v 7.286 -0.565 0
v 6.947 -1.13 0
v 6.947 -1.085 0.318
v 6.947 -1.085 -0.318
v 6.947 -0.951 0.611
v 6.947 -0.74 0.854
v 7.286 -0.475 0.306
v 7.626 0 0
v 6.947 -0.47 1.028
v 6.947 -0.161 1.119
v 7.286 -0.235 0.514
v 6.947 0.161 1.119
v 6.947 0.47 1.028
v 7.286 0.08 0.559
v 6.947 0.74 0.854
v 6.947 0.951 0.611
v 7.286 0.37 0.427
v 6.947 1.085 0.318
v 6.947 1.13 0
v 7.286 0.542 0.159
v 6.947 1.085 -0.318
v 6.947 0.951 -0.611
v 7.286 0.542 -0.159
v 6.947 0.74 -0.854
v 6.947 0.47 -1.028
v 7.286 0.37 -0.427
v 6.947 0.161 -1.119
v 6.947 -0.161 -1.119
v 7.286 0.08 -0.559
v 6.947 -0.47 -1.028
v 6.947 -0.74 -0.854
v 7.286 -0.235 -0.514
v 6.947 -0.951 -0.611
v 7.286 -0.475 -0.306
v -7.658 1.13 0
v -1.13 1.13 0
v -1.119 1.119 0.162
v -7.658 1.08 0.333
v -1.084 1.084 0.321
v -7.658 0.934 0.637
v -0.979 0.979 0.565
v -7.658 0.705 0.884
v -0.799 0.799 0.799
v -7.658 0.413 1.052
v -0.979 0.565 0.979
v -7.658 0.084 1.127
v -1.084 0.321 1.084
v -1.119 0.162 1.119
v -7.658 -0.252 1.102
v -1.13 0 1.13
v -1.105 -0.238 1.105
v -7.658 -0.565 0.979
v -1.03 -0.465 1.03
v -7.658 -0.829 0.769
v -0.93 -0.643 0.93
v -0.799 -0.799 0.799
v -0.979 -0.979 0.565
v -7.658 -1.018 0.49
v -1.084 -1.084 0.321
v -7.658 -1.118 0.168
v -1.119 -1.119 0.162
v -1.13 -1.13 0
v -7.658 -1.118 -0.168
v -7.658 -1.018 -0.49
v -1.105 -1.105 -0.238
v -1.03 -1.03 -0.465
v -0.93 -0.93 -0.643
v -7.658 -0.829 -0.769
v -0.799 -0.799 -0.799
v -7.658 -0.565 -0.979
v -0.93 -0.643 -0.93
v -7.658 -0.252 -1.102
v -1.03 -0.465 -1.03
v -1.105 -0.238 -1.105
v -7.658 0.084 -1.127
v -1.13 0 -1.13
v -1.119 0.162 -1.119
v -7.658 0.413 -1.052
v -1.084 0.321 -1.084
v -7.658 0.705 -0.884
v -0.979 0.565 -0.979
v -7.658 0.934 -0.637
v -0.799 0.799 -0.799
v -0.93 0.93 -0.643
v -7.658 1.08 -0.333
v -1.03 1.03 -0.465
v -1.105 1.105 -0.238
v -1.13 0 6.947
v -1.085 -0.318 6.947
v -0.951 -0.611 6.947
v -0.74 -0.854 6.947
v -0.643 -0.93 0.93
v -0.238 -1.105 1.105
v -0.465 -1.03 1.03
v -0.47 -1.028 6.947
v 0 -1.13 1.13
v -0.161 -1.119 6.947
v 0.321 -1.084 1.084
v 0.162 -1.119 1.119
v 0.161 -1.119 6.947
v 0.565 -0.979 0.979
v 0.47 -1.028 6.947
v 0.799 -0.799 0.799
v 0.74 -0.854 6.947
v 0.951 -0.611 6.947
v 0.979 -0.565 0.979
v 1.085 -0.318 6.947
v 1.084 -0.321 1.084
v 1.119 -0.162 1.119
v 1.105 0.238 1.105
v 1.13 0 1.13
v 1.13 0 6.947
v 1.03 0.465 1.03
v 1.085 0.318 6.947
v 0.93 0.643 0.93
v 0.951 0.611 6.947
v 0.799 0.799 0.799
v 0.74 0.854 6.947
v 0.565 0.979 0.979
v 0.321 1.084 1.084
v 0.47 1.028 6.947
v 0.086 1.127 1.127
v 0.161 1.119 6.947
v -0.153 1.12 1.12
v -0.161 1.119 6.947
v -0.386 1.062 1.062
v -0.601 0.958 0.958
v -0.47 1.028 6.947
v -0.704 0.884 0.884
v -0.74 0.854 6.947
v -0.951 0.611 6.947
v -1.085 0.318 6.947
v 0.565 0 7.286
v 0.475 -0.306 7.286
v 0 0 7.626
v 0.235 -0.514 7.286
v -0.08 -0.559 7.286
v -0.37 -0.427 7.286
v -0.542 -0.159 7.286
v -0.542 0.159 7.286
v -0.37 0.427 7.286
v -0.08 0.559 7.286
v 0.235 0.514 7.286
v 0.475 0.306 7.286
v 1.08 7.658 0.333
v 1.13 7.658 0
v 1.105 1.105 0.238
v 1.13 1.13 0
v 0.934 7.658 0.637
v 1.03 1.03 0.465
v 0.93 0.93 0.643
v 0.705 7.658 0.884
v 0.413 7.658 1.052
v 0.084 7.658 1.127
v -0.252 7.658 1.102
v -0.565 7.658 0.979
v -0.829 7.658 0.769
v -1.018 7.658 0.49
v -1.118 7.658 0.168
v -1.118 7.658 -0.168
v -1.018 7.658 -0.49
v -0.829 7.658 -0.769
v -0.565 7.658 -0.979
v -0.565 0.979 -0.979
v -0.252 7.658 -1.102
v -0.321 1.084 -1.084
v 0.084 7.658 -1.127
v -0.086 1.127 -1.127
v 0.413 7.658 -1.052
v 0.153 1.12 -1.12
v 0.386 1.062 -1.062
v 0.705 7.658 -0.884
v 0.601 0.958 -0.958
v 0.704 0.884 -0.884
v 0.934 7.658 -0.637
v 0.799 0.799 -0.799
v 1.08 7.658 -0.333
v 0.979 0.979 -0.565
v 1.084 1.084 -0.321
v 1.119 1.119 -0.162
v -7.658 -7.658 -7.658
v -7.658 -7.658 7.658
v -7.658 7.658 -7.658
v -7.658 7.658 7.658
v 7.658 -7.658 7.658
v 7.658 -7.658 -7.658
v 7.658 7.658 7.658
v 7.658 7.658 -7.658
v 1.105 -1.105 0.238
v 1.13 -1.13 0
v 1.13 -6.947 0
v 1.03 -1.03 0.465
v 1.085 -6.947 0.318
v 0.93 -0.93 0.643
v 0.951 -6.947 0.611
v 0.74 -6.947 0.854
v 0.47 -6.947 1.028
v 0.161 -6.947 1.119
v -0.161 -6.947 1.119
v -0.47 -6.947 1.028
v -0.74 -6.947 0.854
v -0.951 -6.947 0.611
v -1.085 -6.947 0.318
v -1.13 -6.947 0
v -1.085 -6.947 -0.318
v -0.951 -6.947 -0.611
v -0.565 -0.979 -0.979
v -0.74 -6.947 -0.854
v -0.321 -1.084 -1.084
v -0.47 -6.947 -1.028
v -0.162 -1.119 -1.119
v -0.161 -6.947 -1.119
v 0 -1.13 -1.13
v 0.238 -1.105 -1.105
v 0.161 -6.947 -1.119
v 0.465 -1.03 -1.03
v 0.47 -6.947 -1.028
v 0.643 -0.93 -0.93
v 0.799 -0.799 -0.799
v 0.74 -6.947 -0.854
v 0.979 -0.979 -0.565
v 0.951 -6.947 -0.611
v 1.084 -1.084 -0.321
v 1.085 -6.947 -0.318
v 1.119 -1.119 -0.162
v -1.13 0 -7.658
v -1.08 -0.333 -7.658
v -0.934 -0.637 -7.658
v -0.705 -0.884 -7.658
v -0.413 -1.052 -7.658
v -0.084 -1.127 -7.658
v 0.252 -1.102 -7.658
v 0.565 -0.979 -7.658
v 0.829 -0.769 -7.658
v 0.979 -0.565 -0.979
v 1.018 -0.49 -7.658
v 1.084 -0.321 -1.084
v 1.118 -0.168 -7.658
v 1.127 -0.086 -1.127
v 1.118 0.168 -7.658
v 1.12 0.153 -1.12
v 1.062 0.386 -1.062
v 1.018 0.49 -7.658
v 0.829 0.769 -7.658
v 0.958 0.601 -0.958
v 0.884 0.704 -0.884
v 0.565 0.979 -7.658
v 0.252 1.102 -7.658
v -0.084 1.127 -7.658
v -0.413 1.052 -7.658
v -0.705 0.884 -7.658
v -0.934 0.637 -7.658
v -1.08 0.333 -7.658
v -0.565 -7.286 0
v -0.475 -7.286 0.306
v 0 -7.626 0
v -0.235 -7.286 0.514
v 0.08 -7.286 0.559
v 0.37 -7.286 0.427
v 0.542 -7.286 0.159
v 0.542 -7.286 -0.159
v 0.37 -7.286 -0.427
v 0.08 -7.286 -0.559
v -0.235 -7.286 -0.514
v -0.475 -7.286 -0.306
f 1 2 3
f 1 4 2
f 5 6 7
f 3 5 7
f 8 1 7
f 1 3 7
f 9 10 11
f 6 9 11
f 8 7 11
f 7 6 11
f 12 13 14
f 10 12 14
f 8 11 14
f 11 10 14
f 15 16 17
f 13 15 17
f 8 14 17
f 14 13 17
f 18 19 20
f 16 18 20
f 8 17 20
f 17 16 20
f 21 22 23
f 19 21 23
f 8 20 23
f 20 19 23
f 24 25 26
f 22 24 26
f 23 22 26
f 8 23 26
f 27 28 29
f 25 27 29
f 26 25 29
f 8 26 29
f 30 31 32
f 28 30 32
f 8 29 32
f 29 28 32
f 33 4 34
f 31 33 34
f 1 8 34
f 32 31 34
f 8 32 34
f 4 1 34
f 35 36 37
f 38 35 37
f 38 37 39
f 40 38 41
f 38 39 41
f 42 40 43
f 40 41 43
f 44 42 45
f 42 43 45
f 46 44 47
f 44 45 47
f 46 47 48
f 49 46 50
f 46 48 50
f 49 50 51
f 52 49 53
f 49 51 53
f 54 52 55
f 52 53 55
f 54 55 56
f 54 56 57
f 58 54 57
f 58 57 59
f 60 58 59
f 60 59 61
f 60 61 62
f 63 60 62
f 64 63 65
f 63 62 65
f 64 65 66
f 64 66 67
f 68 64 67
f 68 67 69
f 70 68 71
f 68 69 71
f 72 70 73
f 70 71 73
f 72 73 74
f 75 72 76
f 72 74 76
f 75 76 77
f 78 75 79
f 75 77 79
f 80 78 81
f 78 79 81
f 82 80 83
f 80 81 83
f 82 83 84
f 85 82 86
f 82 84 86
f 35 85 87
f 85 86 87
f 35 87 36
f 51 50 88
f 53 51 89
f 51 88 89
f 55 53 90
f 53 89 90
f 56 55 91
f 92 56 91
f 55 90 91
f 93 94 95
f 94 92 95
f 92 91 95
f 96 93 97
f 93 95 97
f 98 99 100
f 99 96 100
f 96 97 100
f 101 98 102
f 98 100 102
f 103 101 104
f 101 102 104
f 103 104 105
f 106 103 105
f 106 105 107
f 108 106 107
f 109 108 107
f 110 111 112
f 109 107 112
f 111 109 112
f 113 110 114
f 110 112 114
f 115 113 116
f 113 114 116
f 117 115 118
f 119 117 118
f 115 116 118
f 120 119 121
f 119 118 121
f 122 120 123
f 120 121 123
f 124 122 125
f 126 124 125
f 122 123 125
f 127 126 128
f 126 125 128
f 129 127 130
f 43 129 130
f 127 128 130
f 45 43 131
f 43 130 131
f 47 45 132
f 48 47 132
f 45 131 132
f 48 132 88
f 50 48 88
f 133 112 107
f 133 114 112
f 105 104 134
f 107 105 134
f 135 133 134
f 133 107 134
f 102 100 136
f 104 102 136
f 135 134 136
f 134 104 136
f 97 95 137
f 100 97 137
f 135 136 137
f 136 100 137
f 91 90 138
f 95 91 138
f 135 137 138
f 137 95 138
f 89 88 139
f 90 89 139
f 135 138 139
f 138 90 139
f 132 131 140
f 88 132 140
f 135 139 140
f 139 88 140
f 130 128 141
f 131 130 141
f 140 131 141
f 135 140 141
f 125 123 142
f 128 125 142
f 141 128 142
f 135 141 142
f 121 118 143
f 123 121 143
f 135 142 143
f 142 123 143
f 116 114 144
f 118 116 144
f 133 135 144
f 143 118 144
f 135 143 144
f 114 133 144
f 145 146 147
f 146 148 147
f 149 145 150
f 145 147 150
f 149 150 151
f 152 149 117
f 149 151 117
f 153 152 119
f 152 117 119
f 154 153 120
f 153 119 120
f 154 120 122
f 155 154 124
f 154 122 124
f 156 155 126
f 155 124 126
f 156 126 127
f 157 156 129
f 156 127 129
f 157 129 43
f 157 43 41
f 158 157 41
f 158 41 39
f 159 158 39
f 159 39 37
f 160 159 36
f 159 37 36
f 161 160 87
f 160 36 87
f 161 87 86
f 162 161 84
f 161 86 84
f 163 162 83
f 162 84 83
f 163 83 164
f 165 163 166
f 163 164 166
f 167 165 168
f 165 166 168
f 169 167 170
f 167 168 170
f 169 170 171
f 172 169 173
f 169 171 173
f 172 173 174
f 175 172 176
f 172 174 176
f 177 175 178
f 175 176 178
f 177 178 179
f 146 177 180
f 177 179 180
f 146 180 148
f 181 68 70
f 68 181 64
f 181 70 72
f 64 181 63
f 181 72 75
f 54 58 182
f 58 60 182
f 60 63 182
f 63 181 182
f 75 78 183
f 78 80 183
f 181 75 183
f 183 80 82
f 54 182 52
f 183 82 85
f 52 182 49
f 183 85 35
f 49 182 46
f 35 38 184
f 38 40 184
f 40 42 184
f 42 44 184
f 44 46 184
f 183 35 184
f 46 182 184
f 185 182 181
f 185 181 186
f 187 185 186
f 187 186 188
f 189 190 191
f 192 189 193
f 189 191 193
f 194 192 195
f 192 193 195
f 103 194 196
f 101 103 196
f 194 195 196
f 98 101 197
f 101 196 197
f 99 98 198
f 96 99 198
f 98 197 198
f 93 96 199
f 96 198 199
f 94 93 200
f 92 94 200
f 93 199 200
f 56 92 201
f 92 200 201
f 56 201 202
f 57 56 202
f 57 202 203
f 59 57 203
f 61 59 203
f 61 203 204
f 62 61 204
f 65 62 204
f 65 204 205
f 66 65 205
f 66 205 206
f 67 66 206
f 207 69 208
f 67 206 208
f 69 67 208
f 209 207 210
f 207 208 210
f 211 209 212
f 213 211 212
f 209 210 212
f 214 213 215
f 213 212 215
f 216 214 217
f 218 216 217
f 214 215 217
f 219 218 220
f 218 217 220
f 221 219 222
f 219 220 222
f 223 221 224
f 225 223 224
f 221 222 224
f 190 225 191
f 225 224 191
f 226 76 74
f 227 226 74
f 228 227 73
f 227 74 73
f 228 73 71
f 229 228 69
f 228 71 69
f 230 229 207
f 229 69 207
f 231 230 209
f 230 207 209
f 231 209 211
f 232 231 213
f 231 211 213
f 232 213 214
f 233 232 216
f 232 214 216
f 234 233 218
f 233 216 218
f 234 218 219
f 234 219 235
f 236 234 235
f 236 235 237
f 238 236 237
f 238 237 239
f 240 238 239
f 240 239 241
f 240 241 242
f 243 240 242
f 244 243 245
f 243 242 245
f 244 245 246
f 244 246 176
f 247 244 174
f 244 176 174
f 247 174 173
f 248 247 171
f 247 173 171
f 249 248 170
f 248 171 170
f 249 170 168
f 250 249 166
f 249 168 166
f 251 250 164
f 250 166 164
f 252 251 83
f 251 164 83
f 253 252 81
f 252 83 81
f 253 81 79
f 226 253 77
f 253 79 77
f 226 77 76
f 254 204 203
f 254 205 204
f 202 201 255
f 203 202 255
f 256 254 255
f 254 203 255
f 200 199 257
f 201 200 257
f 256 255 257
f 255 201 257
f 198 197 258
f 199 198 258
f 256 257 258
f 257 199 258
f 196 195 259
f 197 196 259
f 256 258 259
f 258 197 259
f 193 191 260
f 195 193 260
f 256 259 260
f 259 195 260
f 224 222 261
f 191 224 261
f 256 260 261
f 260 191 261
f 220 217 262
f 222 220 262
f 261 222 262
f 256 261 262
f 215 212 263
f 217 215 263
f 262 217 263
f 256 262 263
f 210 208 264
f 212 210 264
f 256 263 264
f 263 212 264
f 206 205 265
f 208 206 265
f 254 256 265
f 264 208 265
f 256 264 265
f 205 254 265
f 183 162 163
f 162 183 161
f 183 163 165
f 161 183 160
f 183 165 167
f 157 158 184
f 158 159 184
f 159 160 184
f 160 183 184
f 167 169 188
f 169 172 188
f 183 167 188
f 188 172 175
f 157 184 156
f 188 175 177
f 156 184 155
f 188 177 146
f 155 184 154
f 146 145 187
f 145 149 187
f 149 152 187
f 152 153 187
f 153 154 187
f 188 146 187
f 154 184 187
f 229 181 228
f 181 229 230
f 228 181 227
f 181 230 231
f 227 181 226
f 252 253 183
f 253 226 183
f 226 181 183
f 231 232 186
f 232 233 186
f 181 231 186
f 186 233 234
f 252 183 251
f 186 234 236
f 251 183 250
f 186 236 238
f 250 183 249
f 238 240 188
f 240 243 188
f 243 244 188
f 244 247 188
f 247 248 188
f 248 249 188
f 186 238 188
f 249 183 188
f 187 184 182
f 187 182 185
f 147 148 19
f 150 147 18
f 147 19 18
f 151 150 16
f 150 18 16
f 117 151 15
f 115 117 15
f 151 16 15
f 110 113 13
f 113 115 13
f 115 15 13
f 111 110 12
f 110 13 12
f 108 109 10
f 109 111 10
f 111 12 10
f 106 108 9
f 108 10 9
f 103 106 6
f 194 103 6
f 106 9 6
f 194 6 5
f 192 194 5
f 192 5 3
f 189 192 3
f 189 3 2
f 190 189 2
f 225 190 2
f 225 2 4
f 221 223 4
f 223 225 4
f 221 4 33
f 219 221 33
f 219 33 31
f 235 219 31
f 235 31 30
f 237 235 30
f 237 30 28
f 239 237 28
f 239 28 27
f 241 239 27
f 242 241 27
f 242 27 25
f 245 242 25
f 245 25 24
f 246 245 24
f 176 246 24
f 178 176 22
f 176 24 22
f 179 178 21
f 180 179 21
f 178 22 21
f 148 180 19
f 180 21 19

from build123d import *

# Parameters (mm, degrees)
F0_W          = 15.3162
F0_H          = 15.3162
F1_DEPTH      = 7.6581
F1_DEPTH_BACK = 7.6581
F3_D          = 2.2606
F3_DEPTH      = 14.605
F3_TIP        = 0.6791527577
F5_D          = 2.2606
F5_DEPTH      = 14.605
F5_TIP        = 0.6791527577
F7_D          = 2.2606
F7_DEPTH      = 14.605
F7_TIP        = 0.6791527577


with BuildPart() as f1:
    # F0 (on Top) → F1 (new body, two sides)
    with BuildSketch(Plane.XY) as f1_sk:
        Rectangle(F0_W, F0_H)
    extrude(amount=F1_DEPTH)
    extrude(f1_sk.sketch, amount=-F1_DEPTH_BACK)

    # F3
    with Locations(Plane(origin=(0, 7.6581, 0), x_dir=(-1, 0, 0), z_dir=(0, 1, 0))):
        with Locations((0, 0)):
            Hole(F3_D / 2, depth=F3_DEPTH)
            with Locations((0, 0, -(F3_DEPTH + F3_TIP / 2))):  # 118° drill point
                Cone(0, F3_D / 2, F3_TIP, mode=Mode.SUBTRACT)

    # F5
    with Locations(Plane(origin=(0, 0, -7.6581), x_dir=(1, 0, 0), z_dir=(0, 0, -1))):
        with Locations((0, 0)):
            Hole(F5_D / 2, depth=F5_DEPTH)
            with Locations((0, 0, -(F5_DEPTH + F5_TIP / 2))):  # 118° drill point
                Cone(0, F5_D / 2, F5_TIP, mode=Mode.SUBTRACT)

    # F7
    with Locations(Plane(origin=(-7.6581, 0, 0), x_dir=(0, -1, 0), z_dir=(-1, 0, 0))):
        with Locations((0, 0)):
            Hole(F7_D / 2, depth=F7_DEPTH)
            with Locations((0, 0, -(F7_DEPTH + F7_TIP / 2))):  # 118° drill point
                Cone(0, F7_D / 2, F7_TIP, mode=Mode.SUBTRACT)


solid = f1.part
